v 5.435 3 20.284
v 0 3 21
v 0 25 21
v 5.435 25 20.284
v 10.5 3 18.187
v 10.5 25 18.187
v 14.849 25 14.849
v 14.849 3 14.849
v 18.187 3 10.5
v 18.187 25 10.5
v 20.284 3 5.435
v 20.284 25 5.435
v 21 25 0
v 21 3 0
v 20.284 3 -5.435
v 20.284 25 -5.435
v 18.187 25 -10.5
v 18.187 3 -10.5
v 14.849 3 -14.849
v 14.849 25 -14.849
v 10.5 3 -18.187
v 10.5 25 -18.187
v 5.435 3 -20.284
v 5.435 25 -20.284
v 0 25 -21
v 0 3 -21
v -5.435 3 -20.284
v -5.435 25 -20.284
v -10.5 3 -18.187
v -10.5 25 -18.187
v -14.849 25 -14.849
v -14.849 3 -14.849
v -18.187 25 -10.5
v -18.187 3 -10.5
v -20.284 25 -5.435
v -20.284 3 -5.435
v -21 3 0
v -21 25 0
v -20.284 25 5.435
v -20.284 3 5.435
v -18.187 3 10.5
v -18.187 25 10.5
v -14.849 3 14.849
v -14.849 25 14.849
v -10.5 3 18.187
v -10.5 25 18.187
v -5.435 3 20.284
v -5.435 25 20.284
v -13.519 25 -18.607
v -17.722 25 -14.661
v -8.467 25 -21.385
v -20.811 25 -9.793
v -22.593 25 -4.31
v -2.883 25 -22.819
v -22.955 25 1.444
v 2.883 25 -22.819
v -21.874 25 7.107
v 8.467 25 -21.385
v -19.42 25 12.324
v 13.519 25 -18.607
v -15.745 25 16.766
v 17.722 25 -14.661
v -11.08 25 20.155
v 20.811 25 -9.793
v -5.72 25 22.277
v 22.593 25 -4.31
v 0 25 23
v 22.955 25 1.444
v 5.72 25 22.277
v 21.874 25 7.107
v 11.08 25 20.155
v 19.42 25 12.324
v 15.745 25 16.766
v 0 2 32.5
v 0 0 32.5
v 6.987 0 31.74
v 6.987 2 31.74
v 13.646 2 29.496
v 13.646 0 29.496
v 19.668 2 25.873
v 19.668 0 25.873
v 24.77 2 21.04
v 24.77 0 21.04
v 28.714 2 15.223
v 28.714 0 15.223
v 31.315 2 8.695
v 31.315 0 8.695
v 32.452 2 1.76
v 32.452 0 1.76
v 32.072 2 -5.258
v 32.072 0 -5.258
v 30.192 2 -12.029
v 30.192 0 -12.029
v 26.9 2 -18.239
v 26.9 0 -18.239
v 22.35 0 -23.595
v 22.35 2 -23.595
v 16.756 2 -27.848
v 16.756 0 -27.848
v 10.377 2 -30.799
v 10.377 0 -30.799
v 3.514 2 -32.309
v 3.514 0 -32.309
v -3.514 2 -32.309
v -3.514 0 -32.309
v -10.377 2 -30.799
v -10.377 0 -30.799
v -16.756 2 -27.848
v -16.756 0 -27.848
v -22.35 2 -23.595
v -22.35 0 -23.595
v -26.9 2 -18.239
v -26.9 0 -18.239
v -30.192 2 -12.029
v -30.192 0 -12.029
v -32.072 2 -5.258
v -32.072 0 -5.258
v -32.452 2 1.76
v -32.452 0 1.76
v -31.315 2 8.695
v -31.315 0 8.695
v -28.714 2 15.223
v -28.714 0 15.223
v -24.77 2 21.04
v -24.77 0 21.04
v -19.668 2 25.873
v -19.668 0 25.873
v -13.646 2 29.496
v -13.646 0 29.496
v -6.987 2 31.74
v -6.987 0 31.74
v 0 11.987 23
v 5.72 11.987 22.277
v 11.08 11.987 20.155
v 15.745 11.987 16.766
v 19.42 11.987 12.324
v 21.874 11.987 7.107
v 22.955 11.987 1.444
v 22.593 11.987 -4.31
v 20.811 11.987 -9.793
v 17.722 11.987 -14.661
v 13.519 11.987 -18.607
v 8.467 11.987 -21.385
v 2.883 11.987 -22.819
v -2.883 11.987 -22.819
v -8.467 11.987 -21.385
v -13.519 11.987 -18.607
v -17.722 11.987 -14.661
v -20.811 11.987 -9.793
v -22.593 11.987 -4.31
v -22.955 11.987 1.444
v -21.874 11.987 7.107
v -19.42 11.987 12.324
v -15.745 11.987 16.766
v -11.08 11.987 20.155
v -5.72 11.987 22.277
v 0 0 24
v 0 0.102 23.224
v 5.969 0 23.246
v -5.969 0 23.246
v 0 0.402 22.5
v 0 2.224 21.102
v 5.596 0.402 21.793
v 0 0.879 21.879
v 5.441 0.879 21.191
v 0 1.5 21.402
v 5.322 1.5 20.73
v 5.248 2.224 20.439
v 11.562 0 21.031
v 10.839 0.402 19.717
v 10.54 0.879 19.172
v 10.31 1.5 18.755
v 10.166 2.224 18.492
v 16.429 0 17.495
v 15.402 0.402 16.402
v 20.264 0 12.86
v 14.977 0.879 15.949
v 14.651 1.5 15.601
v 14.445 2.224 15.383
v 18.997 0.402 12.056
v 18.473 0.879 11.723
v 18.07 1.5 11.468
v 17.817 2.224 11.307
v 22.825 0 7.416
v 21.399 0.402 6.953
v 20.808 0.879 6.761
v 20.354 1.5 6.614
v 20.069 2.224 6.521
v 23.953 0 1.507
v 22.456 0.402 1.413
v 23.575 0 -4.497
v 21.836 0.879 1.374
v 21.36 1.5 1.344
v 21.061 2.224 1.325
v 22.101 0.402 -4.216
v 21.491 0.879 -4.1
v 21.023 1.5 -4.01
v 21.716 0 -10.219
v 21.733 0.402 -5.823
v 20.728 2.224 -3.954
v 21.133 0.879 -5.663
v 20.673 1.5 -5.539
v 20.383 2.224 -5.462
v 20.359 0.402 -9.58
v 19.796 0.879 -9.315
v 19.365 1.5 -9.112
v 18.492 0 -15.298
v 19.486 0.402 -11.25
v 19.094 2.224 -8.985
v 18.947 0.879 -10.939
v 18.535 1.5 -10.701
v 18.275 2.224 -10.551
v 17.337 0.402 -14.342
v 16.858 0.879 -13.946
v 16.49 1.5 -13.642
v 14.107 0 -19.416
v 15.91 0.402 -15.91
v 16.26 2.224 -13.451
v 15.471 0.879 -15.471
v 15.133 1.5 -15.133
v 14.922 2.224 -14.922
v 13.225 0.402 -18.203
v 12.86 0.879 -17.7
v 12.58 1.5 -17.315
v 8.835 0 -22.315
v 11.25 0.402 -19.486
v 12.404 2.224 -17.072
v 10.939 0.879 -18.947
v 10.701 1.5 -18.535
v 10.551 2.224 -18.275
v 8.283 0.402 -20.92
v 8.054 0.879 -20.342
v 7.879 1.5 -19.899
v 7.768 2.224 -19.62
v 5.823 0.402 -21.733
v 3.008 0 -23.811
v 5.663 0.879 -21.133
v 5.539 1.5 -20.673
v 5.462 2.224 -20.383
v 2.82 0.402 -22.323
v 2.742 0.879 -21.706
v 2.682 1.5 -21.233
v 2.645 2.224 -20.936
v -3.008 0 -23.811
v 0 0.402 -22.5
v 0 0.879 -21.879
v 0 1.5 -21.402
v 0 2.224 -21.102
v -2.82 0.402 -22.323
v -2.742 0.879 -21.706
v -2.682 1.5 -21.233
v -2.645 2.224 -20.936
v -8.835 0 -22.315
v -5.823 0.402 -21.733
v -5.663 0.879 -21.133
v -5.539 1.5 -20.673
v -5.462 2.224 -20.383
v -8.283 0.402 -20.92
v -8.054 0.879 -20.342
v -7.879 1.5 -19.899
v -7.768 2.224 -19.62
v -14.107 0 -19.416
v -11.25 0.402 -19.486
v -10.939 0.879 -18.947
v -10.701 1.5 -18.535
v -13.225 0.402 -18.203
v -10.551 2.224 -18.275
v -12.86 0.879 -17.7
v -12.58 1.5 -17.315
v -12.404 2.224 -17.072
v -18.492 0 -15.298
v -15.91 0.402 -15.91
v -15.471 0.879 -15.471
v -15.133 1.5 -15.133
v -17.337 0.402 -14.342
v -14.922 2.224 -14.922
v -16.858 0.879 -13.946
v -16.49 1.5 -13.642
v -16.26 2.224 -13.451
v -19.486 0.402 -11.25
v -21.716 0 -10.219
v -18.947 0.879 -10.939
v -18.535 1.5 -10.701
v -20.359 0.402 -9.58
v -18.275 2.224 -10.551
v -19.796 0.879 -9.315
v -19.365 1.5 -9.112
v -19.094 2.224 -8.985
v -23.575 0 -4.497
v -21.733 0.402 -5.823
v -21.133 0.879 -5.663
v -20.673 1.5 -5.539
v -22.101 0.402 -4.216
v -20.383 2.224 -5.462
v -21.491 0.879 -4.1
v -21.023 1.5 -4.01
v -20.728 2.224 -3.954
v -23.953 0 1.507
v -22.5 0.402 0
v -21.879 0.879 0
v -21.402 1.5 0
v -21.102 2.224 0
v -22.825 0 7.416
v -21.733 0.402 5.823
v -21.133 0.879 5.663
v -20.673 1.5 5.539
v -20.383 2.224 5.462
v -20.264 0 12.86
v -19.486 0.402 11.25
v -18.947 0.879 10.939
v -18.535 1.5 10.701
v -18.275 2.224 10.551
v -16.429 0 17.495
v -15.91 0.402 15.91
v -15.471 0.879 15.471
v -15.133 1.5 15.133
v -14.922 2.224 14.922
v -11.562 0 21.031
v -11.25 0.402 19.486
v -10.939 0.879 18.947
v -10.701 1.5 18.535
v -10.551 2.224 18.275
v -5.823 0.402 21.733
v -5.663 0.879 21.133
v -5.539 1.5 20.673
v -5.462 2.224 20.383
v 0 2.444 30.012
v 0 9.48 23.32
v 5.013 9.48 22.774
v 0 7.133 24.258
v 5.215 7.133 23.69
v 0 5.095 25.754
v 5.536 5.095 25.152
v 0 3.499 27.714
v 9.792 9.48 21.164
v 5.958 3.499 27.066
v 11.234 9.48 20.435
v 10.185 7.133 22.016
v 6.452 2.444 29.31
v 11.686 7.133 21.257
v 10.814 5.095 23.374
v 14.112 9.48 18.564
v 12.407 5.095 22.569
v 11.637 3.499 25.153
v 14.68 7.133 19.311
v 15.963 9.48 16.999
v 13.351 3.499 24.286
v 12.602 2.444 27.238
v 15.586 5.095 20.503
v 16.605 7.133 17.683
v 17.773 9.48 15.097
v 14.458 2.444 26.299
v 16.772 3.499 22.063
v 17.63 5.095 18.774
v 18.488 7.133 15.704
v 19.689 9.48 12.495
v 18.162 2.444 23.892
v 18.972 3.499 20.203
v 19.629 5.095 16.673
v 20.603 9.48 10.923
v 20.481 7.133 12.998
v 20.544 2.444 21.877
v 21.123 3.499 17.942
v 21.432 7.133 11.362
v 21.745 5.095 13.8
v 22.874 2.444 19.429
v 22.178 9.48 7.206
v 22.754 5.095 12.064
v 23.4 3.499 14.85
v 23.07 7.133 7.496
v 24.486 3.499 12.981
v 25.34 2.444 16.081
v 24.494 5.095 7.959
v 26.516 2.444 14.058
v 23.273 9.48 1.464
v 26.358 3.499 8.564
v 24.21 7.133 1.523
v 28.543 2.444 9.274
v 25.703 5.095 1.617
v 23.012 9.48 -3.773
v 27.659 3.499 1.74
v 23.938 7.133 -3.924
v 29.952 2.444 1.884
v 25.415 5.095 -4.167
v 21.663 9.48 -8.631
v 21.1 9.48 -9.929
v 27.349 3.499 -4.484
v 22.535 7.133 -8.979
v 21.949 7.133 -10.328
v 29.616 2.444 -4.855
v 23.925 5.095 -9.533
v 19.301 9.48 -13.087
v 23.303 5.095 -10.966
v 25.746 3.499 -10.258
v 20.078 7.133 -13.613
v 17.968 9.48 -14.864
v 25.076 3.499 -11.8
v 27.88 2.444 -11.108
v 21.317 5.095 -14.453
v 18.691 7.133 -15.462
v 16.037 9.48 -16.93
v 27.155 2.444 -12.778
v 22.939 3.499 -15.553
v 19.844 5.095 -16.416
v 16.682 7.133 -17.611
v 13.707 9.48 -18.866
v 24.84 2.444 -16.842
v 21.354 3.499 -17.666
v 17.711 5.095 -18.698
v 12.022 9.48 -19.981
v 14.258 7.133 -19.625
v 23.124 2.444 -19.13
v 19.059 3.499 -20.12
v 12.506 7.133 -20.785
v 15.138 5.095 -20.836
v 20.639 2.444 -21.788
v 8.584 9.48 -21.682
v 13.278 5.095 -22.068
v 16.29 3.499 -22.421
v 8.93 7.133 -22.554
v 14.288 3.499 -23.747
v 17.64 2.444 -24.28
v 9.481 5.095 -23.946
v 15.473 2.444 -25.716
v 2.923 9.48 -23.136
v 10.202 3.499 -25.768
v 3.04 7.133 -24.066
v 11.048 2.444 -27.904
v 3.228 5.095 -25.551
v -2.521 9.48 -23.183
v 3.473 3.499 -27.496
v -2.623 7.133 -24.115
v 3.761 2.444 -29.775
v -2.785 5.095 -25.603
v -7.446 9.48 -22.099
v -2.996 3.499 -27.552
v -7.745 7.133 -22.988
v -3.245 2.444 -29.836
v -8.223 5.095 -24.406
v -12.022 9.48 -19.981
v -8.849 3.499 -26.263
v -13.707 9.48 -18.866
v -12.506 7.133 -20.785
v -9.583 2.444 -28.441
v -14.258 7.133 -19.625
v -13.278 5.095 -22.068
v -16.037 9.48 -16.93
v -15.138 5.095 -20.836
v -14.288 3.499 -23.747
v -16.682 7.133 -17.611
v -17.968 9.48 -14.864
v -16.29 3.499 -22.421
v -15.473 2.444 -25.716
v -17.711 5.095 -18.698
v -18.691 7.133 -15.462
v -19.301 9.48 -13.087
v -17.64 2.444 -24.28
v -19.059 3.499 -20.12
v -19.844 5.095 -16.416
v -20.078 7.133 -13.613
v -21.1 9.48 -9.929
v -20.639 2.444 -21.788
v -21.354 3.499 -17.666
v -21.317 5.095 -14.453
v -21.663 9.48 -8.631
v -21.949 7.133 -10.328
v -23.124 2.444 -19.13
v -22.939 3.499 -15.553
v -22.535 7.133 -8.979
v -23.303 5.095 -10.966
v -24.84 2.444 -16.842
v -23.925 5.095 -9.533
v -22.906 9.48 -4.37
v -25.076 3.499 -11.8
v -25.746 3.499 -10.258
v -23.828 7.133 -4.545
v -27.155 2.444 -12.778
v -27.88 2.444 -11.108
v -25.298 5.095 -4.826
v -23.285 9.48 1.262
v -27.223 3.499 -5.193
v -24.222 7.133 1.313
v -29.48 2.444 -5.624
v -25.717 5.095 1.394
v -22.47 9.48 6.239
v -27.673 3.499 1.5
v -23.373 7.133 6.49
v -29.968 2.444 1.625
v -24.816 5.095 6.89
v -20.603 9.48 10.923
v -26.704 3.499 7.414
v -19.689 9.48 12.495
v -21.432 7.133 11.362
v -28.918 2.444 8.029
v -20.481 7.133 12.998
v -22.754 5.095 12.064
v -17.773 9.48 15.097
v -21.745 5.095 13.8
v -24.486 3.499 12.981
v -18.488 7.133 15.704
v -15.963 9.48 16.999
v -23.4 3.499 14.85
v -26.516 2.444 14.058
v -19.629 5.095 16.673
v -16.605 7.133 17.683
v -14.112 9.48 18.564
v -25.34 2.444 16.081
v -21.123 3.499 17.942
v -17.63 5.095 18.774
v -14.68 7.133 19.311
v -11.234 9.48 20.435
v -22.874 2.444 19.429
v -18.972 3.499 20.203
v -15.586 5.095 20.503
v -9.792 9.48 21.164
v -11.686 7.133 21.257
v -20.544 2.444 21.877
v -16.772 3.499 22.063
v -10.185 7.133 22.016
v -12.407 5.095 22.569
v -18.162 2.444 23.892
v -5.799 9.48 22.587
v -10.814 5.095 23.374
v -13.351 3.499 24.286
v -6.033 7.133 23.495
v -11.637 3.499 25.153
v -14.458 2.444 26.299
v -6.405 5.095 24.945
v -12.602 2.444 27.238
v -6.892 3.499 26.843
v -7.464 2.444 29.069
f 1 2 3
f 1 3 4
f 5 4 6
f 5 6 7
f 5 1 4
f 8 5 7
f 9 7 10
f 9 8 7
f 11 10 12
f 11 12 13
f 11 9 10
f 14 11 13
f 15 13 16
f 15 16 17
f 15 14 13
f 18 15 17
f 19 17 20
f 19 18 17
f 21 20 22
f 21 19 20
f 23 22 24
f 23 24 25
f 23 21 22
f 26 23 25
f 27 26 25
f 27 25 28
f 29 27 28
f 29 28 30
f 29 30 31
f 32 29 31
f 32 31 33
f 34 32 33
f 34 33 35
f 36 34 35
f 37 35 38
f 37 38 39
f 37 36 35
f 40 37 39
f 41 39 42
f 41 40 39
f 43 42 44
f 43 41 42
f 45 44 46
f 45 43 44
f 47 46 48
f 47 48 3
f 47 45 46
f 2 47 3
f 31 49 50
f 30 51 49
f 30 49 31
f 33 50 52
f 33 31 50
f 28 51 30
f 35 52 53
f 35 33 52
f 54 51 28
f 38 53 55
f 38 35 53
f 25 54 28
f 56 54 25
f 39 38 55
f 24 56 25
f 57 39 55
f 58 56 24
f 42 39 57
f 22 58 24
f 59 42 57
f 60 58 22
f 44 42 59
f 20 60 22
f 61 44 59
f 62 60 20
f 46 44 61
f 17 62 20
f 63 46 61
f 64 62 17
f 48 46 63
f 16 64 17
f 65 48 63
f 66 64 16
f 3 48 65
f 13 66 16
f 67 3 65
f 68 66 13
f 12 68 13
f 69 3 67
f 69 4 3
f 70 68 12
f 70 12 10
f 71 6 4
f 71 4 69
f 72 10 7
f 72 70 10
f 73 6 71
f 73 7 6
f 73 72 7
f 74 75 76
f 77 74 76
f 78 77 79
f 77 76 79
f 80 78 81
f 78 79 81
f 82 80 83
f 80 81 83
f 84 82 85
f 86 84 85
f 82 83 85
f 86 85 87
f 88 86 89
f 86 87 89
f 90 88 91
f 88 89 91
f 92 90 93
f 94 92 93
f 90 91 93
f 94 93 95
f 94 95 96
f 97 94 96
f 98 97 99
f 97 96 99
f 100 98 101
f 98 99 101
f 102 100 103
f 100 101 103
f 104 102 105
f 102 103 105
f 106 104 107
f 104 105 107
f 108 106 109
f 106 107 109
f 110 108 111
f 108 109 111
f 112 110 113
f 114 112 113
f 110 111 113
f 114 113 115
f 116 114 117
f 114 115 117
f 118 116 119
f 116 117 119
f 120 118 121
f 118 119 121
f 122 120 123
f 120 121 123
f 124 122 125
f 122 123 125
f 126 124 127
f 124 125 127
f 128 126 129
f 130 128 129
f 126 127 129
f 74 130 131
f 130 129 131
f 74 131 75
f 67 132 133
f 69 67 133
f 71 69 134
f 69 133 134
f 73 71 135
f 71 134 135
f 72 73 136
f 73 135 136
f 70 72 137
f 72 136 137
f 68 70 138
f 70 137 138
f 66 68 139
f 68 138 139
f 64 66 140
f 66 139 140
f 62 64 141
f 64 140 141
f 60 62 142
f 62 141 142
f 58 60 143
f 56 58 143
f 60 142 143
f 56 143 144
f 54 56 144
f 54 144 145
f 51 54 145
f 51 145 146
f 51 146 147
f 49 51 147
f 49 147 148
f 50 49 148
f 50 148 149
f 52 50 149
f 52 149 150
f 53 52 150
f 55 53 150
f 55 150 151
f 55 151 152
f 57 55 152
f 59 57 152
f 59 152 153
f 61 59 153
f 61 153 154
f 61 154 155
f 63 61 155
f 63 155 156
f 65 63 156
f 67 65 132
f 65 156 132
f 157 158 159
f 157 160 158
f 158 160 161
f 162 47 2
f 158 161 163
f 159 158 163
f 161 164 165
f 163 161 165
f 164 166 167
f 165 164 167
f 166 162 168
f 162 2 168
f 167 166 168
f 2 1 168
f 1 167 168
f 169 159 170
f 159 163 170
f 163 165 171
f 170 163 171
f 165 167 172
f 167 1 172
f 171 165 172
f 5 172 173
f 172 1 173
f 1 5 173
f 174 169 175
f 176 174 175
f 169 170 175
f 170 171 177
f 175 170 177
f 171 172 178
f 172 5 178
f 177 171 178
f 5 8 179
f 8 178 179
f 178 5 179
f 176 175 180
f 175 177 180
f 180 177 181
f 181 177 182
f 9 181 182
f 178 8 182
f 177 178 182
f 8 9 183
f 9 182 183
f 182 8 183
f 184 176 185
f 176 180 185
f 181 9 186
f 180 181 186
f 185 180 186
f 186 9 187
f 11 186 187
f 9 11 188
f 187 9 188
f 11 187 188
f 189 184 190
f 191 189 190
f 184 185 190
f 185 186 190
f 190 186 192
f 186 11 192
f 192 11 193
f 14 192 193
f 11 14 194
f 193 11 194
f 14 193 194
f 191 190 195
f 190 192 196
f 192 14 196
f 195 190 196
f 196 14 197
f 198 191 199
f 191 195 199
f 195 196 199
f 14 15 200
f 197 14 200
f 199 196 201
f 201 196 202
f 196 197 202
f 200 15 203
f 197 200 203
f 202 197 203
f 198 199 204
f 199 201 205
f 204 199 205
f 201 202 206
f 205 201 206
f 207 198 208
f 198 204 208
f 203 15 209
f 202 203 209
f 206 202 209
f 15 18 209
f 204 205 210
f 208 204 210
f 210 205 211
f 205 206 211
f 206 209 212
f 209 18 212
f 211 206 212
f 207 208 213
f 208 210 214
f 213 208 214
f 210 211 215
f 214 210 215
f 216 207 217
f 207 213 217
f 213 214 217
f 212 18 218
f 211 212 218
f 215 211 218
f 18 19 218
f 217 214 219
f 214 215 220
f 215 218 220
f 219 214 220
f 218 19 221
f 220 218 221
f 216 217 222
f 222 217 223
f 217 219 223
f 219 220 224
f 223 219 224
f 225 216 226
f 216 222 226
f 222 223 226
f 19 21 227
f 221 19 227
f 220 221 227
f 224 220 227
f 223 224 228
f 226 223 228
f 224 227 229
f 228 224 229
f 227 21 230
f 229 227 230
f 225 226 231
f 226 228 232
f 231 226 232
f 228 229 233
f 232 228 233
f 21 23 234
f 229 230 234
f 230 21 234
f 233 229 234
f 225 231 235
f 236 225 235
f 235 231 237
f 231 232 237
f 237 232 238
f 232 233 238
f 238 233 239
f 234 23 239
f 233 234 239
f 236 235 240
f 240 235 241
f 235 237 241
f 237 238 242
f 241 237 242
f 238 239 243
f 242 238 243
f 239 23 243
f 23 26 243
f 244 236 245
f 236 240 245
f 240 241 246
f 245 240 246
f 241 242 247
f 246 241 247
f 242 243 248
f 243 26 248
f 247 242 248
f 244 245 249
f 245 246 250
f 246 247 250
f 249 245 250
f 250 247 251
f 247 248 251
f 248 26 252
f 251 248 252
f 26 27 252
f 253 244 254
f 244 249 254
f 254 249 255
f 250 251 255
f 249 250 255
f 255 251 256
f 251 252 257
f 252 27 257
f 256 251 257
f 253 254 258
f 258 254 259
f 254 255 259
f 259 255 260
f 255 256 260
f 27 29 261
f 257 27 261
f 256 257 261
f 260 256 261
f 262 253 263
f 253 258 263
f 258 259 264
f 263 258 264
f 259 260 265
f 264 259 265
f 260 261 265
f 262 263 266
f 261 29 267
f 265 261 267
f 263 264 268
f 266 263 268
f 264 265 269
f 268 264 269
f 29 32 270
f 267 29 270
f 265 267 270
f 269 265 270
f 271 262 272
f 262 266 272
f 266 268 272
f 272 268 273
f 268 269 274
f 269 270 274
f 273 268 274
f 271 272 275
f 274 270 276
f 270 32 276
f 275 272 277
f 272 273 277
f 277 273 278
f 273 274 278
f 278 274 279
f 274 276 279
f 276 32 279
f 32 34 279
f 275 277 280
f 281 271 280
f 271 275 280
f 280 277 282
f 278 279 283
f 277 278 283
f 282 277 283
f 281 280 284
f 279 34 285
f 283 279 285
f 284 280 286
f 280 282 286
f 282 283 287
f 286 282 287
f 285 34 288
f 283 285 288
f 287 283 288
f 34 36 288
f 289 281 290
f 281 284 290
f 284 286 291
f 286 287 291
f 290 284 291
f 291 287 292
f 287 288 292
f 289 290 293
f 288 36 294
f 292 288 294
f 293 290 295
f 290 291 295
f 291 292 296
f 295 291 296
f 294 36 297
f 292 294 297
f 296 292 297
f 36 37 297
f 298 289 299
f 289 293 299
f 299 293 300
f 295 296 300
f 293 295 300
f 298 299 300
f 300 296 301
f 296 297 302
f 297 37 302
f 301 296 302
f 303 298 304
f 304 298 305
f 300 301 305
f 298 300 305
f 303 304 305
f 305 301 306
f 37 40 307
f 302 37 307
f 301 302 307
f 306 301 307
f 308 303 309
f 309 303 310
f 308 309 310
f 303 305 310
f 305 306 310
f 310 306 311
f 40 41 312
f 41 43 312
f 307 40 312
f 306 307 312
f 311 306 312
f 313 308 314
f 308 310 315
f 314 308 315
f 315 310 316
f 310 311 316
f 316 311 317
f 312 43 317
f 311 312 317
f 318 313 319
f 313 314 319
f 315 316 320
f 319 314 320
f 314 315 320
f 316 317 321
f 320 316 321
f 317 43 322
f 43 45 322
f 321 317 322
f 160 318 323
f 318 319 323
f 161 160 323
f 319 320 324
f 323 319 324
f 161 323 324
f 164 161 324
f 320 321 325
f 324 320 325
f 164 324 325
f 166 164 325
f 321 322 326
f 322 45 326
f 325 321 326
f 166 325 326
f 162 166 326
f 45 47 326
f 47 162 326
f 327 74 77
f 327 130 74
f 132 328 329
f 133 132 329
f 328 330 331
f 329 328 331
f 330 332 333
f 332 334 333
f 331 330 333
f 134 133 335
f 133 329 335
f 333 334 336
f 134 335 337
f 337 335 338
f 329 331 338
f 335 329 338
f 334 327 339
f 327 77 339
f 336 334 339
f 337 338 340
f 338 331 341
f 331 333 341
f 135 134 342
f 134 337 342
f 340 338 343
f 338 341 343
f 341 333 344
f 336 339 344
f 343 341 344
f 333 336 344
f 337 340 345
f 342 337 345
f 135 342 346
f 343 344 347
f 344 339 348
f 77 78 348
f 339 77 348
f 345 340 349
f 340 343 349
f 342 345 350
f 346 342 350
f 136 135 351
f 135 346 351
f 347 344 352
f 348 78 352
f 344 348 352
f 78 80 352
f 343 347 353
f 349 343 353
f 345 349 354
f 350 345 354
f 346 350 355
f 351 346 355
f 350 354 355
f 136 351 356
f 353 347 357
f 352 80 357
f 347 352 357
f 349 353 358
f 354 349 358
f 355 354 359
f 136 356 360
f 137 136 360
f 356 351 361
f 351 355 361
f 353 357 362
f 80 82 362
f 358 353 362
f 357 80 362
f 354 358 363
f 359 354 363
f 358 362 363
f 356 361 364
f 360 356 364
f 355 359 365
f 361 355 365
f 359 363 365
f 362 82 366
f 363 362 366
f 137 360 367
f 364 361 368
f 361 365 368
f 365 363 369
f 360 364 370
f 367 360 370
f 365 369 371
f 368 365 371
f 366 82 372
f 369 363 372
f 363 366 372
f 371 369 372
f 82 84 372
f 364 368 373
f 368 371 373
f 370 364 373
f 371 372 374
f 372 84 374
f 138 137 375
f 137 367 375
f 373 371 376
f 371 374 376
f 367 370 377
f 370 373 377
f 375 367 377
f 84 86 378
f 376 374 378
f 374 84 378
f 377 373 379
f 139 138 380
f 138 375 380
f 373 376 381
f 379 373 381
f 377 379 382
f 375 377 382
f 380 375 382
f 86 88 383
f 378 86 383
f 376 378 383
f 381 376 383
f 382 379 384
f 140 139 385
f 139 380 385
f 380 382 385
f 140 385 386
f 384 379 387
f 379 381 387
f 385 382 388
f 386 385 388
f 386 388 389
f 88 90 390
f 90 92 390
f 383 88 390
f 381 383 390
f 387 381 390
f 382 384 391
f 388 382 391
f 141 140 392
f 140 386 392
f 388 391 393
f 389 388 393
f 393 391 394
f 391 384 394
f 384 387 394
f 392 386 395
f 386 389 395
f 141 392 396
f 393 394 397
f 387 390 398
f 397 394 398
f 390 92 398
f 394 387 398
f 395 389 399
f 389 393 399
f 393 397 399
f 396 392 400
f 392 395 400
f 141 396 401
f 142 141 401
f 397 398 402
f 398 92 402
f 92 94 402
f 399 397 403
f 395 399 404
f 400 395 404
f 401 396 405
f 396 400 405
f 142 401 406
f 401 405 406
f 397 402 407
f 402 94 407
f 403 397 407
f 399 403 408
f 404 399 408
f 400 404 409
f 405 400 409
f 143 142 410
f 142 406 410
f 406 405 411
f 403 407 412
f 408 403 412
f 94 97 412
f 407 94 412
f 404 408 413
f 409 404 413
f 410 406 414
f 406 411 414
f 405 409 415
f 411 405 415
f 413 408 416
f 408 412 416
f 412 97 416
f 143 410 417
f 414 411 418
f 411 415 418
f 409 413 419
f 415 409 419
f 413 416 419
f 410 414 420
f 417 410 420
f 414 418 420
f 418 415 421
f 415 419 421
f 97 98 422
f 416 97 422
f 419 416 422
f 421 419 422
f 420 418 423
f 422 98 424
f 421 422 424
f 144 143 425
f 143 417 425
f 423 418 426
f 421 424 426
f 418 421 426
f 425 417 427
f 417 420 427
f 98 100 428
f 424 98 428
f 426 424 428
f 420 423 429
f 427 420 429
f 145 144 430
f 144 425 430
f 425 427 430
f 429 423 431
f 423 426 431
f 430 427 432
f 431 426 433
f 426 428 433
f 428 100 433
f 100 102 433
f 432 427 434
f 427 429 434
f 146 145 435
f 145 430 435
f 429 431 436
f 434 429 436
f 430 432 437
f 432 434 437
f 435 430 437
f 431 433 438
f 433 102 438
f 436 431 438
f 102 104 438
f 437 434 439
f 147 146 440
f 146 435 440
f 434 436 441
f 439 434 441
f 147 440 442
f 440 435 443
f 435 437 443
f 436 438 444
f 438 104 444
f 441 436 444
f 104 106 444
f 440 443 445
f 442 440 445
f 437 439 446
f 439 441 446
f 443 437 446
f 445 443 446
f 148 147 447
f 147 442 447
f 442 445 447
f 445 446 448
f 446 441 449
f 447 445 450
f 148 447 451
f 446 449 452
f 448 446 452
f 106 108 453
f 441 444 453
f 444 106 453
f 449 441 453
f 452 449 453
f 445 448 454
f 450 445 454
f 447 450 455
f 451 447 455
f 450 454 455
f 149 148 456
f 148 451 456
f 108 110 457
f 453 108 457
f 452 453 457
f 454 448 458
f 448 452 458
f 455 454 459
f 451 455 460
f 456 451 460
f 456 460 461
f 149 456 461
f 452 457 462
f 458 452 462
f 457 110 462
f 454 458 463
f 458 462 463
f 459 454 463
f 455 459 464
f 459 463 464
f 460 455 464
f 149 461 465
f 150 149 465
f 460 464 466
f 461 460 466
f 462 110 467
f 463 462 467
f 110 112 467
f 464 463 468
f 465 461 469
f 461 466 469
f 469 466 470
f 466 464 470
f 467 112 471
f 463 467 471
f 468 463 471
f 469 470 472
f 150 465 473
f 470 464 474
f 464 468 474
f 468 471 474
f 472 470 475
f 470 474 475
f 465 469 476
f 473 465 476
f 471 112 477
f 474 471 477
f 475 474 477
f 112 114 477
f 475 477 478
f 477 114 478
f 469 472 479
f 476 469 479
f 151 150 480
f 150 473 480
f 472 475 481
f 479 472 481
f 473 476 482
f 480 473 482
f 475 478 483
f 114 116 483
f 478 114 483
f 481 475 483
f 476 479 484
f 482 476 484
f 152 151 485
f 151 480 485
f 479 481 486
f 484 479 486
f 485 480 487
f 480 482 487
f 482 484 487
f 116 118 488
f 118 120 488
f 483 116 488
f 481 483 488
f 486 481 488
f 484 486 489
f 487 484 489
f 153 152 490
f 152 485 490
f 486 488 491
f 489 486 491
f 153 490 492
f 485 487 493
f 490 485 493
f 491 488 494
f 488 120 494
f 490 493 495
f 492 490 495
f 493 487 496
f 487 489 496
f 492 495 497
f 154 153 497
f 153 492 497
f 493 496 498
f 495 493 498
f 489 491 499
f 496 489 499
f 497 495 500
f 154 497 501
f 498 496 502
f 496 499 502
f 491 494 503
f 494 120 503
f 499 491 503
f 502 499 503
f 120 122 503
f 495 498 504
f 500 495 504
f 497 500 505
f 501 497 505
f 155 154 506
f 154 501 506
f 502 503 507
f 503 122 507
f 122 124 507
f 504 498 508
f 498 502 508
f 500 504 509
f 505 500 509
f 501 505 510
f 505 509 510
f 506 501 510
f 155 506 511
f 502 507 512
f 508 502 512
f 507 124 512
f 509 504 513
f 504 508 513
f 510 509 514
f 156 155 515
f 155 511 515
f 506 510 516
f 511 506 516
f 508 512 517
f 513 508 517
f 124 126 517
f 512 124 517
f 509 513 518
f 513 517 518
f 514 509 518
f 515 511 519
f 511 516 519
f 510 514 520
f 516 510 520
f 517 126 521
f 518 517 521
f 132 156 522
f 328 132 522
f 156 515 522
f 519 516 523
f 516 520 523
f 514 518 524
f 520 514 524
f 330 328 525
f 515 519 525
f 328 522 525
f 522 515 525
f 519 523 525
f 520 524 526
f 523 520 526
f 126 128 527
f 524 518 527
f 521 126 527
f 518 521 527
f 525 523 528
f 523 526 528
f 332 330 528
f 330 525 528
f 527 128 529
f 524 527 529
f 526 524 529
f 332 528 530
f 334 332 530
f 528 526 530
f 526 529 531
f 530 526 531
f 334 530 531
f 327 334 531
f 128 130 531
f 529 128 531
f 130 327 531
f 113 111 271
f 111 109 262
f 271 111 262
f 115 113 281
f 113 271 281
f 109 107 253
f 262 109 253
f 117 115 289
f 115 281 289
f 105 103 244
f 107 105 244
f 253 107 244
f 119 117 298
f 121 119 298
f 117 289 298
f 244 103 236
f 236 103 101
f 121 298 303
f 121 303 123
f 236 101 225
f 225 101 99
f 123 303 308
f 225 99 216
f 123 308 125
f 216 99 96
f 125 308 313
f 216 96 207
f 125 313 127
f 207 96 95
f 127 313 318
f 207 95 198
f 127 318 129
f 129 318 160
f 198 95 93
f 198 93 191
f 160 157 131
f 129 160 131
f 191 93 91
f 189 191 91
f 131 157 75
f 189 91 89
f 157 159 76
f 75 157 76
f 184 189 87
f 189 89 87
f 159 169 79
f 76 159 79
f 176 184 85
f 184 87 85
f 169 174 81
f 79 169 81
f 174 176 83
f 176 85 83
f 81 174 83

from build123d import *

# Parameters (mm, degrees)
SKETCH1_R           = 23
SKETCH1_R_2         = 21
BOSS_EXTRUDE1_DEPTH = 25
SKETCH2_R           = 32.5
SKETCH2_R_2         = 23
BOSS_EXTRUDE2_DEPTH = 2
FILLET1_R           = 10
FILLET2_R           = 3


with BuildPart() as part:
    # Sketch1 → Boss-Extrude1 (new body)
    with BuildSketch(Plane(origin=(0, 0, 0), x_dir=(1, 0, 0), z_dir=(0, 1, 0))):
        with Locations(Location((0, 0, 0), (0, 0, 270))):
            Circle(SKETCH1_R)
        with Locations(Location((0, 0, 0), (0, 0, 270))):
            Circle(SKETCH1_R_2, mode=Mode.SUBTRACT)
    extrude(amount=BOSS_EXTRUDE1_DEPTH)

    # Sketch2 → Boss-Extrude2 (add)
    with BuildSketch(Plane(origin=(0, 0, 0), x_dir=(1, 0, 0), z_dir=(0, 1, 0))):
        with Locations(Location((0, 0, 0), (0, 0, 270))):
            Circle(SKETCH2_R)
        with Locations(Location((0, 0, 0), (0, 0, 270))):
            Circle(SKETCH2_R_2, mode=Mode.SUBTRACT)
    extrude(amount=BOSS_EXTRUDE2_DEPTH)

    # Fillet1
    # the kernel refuses this fillet: 10 mm, written as the material it adds along each edge
    with BuildSketch(Plane(origin=(0, 2, 0), x_dir=(-1.8e-16, 0, 1), z_dir=(-1, 0, -1.8e-16))) as fillet1_piece_1:
        with BuildLine():
            CenterArc((33, 9.98749217771909), FILLET1_R, 180, 87.13401601740111)
            Line((32.5, 1.78e-15), (32.49, -0.19974984355438008))
            ThreePointArc((32.49, -0.19974984355438008), (27.75, -0.19999999999999996), (23, -0.19999999999999996))
            Line((23, -0.19999999999999996), (22.8, 0))
            Line((22.8, 0), (22.8, 9.98749217771909))
            Line((22.8, 9.98749217771909), (23, 9.98749217771909))
        make_face()
    revolve(axis=Axis((0, 2, 0), (0, 1, 0)))

    # Fillet2
    fillet2_edges = [part.edges().sort_by_distance(p)[0] for p in [
        (6.43e-15, 0, -21),
    ]]
    fillet(fillet2_edges, radius=FILLET2_R)


solid = part.part
